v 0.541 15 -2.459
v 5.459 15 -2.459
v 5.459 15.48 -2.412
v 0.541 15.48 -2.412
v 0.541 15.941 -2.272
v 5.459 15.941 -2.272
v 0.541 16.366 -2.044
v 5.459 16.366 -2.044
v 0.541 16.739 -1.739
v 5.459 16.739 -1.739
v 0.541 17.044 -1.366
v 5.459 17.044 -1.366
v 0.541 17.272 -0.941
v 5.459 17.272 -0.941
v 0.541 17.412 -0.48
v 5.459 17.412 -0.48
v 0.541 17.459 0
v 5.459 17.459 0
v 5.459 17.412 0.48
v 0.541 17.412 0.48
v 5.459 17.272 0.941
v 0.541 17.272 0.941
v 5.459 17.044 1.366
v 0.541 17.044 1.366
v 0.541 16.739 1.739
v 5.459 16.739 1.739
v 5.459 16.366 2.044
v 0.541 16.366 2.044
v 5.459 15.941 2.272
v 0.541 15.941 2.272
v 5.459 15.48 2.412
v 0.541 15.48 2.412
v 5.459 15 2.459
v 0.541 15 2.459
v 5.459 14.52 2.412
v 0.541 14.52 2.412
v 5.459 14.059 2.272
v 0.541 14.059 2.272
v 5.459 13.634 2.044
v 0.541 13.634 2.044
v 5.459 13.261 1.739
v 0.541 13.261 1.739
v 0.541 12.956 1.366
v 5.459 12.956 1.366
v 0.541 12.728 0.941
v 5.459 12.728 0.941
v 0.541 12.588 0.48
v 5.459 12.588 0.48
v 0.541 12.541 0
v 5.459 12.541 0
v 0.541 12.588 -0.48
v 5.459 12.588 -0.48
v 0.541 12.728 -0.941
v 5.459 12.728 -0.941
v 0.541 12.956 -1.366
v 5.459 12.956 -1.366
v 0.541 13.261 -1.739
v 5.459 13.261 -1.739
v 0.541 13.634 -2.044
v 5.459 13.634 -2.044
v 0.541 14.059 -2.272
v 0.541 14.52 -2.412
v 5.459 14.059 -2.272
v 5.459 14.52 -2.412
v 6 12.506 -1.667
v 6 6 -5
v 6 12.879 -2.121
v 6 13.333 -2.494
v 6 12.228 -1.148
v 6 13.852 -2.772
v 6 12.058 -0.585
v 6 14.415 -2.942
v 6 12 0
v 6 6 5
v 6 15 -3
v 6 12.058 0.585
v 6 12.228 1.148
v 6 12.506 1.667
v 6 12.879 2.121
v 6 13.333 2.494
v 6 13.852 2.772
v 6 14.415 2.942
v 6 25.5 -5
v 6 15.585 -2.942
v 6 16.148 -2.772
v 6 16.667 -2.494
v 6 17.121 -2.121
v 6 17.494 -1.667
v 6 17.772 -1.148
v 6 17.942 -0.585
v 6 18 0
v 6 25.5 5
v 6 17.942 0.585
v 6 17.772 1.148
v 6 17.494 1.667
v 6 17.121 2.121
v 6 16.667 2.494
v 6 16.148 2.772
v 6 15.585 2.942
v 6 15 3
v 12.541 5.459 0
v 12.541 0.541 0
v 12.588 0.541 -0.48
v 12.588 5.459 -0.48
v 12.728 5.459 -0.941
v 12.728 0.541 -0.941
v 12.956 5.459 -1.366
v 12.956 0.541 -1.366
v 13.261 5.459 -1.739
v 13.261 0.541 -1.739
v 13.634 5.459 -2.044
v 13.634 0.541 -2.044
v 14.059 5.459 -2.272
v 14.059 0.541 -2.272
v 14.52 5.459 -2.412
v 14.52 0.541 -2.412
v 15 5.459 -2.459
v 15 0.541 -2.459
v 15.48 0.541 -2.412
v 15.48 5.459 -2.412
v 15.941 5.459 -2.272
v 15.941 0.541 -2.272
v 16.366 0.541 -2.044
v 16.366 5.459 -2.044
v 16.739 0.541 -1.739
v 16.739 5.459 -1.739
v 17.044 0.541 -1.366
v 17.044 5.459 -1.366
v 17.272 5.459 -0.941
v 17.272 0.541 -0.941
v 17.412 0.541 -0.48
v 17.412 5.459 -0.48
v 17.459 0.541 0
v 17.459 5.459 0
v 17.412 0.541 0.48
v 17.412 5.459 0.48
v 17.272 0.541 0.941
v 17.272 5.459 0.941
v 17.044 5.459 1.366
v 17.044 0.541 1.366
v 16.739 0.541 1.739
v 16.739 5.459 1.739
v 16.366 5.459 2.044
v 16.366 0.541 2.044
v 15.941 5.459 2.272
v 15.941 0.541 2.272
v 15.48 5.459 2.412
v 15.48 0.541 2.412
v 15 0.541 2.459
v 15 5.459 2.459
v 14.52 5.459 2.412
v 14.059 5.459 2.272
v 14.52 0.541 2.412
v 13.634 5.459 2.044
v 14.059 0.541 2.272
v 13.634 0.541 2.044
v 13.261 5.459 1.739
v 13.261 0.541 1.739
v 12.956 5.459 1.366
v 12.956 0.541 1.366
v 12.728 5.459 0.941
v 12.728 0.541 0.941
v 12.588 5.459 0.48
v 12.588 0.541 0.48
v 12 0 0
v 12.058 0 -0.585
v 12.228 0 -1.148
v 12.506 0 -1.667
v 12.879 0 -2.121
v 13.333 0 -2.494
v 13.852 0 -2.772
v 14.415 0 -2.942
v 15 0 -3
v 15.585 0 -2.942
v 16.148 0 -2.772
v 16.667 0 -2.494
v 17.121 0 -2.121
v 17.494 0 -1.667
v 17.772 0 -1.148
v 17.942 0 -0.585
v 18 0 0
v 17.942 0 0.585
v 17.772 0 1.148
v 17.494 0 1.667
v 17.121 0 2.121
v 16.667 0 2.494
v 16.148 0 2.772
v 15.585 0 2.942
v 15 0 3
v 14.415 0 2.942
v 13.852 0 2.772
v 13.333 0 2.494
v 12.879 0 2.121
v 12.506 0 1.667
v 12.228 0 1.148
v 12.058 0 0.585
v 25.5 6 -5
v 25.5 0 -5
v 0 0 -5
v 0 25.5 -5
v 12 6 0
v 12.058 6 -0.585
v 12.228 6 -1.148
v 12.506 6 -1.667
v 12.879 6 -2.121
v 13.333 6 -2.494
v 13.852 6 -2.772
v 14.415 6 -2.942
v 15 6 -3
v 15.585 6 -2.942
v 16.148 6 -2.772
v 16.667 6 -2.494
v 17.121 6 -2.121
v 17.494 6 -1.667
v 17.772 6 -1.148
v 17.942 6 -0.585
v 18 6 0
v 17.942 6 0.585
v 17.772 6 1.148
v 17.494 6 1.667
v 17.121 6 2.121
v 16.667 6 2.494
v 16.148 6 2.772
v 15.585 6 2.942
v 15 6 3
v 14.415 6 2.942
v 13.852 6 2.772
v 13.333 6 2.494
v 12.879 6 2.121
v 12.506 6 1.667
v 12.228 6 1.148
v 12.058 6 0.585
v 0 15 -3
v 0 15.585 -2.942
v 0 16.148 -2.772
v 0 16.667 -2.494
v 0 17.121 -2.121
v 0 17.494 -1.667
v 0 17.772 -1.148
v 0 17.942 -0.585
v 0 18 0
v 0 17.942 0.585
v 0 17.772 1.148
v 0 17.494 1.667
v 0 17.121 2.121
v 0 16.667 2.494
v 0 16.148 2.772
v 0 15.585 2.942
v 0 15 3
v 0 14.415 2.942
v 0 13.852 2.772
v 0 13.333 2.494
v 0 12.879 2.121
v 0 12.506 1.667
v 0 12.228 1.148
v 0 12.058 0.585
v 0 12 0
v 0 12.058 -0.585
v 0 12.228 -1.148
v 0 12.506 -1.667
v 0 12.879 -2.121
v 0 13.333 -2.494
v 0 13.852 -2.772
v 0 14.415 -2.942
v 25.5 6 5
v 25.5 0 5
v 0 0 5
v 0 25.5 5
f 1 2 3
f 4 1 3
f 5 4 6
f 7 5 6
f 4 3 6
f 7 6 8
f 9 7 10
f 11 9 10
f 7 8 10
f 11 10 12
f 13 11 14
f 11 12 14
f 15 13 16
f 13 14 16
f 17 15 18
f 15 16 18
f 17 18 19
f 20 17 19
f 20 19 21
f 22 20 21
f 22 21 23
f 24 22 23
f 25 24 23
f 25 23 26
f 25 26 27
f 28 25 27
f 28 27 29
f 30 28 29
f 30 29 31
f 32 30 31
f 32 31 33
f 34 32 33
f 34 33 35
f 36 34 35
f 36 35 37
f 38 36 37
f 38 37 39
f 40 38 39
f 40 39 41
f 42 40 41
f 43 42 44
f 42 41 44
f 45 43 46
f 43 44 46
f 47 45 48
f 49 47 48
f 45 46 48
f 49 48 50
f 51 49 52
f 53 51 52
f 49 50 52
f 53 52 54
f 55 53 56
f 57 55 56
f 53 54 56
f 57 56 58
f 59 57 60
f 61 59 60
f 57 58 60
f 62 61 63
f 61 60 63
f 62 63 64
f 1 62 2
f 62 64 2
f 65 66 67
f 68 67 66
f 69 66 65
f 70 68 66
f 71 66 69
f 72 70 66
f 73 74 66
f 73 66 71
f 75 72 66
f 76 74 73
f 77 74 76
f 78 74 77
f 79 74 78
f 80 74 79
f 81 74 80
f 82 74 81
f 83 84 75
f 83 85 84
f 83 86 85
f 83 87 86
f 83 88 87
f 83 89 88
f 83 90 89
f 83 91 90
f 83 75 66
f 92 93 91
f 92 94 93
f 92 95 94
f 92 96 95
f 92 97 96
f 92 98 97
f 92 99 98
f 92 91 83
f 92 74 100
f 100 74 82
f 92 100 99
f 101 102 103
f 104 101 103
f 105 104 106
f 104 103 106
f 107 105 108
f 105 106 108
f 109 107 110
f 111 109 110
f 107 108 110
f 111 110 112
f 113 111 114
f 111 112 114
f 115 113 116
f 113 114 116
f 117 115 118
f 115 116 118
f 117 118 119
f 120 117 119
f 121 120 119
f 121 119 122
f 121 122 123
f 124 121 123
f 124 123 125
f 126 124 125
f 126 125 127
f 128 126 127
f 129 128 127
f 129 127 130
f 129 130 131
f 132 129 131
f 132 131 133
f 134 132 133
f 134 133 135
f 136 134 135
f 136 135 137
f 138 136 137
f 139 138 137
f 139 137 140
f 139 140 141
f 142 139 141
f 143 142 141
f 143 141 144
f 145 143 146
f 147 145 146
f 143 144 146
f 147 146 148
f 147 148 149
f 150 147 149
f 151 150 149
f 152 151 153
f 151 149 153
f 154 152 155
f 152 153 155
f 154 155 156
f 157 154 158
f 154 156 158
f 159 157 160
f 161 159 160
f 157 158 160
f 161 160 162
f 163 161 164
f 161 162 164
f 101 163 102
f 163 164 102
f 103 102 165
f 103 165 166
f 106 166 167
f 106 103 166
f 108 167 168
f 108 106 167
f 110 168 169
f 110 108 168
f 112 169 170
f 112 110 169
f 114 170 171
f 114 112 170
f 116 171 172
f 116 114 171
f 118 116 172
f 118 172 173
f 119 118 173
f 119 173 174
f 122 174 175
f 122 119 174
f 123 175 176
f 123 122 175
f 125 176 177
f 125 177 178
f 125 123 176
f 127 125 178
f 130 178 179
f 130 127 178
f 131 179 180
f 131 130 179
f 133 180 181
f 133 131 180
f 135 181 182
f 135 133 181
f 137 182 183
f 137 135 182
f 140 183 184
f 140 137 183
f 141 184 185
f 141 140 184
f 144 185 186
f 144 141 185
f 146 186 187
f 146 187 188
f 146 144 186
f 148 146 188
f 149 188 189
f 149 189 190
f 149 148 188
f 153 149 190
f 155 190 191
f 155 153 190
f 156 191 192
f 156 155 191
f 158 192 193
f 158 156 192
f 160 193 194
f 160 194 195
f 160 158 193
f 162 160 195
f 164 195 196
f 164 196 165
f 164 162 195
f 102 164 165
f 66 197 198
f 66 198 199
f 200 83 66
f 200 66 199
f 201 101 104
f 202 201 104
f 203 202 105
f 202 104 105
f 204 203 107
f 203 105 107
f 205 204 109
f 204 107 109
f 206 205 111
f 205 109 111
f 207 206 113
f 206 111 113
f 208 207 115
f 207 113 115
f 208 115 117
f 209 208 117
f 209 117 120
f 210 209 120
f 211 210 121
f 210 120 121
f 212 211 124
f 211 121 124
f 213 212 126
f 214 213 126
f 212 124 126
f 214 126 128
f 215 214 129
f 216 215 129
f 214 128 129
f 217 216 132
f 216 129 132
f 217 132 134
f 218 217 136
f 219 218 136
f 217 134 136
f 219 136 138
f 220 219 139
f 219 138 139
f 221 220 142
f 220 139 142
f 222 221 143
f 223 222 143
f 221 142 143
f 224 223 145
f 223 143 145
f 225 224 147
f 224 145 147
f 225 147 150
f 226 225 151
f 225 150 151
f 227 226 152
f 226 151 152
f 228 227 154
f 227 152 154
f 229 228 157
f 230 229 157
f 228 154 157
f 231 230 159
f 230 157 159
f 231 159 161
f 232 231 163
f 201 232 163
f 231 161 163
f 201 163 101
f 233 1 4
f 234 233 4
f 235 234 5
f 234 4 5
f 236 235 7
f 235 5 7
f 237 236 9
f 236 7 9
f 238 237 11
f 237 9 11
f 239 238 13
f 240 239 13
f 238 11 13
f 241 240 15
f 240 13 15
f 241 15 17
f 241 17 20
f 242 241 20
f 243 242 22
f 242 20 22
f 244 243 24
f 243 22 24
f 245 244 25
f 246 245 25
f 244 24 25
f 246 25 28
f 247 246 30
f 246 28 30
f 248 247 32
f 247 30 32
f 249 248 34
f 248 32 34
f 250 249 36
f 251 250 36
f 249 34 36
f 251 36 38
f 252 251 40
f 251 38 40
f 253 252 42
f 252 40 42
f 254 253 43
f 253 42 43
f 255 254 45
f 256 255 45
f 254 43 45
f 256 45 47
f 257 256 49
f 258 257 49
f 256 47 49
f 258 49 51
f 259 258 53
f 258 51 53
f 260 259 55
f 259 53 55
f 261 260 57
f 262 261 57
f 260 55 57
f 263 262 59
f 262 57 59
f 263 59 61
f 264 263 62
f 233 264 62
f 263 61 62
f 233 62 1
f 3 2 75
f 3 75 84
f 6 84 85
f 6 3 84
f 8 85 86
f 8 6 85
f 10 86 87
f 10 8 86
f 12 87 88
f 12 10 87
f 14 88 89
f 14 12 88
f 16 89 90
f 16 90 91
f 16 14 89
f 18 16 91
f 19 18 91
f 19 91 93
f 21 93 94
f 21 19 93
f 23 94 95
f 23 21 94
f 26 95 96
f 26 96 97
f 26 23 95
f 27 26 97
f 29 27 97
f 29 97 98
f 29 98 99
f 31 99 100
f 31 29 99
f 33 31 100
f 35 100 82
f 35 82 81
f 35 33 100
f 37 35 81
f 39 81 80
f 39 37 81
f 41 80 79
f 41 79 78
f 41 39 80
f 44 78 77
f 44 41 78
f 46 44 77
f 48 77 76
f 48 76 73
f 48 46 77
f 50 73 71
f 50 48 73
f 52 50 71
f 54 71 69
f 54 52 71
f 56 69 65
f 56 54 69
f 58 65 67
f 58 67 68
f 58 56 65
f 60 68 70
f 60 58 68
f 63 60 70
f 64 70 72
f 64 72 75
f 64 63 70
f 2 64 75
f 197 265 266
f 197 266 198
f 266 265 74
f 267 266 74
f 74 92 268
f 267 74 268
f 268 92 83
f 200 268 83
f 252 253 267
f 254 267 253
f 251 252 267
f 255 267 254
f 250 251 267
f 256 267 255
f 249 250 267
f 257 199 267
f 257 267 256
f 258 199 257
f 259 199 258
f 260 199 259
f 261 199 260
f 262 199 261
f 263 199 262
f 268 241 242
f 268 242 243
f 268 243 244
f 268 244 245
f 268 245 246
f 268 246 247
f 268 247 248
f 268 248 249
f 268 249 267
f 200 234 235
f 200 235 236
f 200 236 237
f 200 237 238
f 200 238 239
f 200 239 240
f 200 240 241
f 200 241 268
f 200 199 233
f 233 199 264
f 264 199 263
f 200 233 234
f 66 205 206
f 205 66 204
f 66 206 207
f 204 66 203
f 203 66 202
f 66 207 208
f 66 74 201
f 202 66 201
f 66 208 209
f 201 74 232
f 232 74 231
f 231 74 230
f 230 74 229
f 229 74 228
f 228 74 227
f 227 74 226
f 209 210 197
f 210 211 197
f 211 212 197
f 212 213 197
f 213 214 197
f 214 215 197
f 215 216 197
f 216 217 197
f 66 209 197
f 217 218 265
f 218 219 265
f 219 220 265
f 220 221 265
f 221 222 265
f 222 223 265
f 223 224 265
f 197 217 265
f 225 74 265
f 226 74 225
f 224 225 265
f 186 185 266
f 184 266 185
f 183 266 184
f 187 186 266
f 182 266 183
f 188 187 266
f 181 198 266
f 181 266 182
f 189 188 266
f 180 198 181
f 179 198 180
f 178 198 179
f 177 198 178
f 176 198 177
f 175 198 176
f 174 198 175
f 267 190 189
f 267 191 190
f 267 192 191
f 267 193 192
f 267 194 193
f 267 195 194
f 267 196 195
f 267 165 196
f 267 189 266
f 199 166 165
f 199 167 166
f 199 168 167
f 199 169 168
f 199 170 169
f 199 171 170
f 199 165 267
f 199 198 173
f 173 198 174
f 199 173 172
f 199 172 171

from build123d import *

# Parameters (mm, degrees)
ESQUISSE1_W             = 45
ESQUISSE1_H             = 45
BOSS_EXTRU_1_DEPTH      = 10
ESQUISSE2_W             = 39
ESQUISSE2_H             = 39
ENL_V_MAT_EXTRU_1_DEPTH = 65.420493634
PER_AGE1_D              = 4.9175
PER_AGE2_D              = 4.9175
PER_AGE2_DEPTH          = 45
PER_AGE3_D              = 4.9175
CHANFREIN1_SIZE         = 0.54125
ESQUISSE9_W             = 19.5
ESQUISSE9_H             = 10
ENL_V_MAT_EXTRU_2_DEPTH = 10
ESQUISSE10_W            = 10
ESQUISSE10_H            = 19.5
ENL_V_MAT_EXTRU_3_DEPTH = 10


with BuildPart() as part:
    # Esquisse1 → Boss.-Extru.1 (new body)
    with BuildSketch(Plane(origin=(0, 0, -5), x_dir=(-1, 0, 0), z_dir=(0, 0, -1))):
        with Locations((-22.5, 22.5)):
            Rectangle(ESQUISSE1_W, ESQUISSE1_H)
    extrude(amount=-BOSS_EXTRU_1_DEPTH)

    # Esquisse2 → Enlèv. mat.-Extru.1 (cut, through all)
    with BuildSketch(Plane.XY.offset(5)):
        with Locations((25.5, 25.5)):
            Rectangle(ESQUISSE2_W, ESQUISSE2_H)
    extrude(amount=-ENL_V_MAT_EXTRU_1_DEPTH, mode=Mode.SUBTRACT)

    # Perçage1 (through all)
    with Locations(Plane(origin=(0, 6, 0), x_dir=(1, 0, 0), z_dir=(0, 1, 0))):
        with Locations((35, 0), (15, 0)):
            Hole(PER_AGE1_D / 2)

    # Perçage2
    with Locations(Plane.ZY):
        with Locations((0, 15)):
            Hole(PER_AGE2_D / 2, depth=PER_AGE2_DEPTH)

    # Perçage3 (through all)
    with Locations(Plane(origin=(6, 0, 0), x_dir=(0, 0, -1), z_dir=(1, 0, 0))):
        with Locations((0, 35)):
            Hole(PER_AGE3_D / 2)

    # Chanfrein1
    chanfrein1_edges = [part.edges().sort_by_distance(p)[0] for p in [
        (17.45875, 6, 0),
        (17.45875, 0, 0),
        (37.45875, 6, 0),
        (37.45875, 0, 0),
        (6, 15, 2.45875),
        (0, 15, 2.45875),
        (6, 35, -2.45875),
        (0, 35, -2.45875),
    ]]
    chamfer(chanfrein1_edges, length=CHANFREIN1_SIZE)

    # Esquisse9 → Enlèv. mat.-Extru.2 (cut)
    with BuildSketch(Plane(origin=(0, 6, 0), x_dir=(1, 0, 0), z_dir=(0, 1, 0))):
        with Locations((35.25, 0)):
            Rectangle(ESQUISSE9_W, ESQUISSE9_H)
    extrude(amount=-ENL_V_MAT_EXTRU_2_DEPTH, mode=Mode.SUBTRACT)

    # Esquisse10 → Enlèv. mat.-Extru.3 (cut)
    with BuildSketch(Plane(origin=(6, 0, 0), x_dir=(0, 0, -1), z_dir=(1, 0, 0))):
        with Locations((0, 35.25)):
            Rectangle(ESQUISSE10_W, ESQUISSE10_H)
    extrude(amount=-ENL_V_MAT_EXTRU_3_DEPTH, mode=Mode.SUBTRACT)


solid = part.part
